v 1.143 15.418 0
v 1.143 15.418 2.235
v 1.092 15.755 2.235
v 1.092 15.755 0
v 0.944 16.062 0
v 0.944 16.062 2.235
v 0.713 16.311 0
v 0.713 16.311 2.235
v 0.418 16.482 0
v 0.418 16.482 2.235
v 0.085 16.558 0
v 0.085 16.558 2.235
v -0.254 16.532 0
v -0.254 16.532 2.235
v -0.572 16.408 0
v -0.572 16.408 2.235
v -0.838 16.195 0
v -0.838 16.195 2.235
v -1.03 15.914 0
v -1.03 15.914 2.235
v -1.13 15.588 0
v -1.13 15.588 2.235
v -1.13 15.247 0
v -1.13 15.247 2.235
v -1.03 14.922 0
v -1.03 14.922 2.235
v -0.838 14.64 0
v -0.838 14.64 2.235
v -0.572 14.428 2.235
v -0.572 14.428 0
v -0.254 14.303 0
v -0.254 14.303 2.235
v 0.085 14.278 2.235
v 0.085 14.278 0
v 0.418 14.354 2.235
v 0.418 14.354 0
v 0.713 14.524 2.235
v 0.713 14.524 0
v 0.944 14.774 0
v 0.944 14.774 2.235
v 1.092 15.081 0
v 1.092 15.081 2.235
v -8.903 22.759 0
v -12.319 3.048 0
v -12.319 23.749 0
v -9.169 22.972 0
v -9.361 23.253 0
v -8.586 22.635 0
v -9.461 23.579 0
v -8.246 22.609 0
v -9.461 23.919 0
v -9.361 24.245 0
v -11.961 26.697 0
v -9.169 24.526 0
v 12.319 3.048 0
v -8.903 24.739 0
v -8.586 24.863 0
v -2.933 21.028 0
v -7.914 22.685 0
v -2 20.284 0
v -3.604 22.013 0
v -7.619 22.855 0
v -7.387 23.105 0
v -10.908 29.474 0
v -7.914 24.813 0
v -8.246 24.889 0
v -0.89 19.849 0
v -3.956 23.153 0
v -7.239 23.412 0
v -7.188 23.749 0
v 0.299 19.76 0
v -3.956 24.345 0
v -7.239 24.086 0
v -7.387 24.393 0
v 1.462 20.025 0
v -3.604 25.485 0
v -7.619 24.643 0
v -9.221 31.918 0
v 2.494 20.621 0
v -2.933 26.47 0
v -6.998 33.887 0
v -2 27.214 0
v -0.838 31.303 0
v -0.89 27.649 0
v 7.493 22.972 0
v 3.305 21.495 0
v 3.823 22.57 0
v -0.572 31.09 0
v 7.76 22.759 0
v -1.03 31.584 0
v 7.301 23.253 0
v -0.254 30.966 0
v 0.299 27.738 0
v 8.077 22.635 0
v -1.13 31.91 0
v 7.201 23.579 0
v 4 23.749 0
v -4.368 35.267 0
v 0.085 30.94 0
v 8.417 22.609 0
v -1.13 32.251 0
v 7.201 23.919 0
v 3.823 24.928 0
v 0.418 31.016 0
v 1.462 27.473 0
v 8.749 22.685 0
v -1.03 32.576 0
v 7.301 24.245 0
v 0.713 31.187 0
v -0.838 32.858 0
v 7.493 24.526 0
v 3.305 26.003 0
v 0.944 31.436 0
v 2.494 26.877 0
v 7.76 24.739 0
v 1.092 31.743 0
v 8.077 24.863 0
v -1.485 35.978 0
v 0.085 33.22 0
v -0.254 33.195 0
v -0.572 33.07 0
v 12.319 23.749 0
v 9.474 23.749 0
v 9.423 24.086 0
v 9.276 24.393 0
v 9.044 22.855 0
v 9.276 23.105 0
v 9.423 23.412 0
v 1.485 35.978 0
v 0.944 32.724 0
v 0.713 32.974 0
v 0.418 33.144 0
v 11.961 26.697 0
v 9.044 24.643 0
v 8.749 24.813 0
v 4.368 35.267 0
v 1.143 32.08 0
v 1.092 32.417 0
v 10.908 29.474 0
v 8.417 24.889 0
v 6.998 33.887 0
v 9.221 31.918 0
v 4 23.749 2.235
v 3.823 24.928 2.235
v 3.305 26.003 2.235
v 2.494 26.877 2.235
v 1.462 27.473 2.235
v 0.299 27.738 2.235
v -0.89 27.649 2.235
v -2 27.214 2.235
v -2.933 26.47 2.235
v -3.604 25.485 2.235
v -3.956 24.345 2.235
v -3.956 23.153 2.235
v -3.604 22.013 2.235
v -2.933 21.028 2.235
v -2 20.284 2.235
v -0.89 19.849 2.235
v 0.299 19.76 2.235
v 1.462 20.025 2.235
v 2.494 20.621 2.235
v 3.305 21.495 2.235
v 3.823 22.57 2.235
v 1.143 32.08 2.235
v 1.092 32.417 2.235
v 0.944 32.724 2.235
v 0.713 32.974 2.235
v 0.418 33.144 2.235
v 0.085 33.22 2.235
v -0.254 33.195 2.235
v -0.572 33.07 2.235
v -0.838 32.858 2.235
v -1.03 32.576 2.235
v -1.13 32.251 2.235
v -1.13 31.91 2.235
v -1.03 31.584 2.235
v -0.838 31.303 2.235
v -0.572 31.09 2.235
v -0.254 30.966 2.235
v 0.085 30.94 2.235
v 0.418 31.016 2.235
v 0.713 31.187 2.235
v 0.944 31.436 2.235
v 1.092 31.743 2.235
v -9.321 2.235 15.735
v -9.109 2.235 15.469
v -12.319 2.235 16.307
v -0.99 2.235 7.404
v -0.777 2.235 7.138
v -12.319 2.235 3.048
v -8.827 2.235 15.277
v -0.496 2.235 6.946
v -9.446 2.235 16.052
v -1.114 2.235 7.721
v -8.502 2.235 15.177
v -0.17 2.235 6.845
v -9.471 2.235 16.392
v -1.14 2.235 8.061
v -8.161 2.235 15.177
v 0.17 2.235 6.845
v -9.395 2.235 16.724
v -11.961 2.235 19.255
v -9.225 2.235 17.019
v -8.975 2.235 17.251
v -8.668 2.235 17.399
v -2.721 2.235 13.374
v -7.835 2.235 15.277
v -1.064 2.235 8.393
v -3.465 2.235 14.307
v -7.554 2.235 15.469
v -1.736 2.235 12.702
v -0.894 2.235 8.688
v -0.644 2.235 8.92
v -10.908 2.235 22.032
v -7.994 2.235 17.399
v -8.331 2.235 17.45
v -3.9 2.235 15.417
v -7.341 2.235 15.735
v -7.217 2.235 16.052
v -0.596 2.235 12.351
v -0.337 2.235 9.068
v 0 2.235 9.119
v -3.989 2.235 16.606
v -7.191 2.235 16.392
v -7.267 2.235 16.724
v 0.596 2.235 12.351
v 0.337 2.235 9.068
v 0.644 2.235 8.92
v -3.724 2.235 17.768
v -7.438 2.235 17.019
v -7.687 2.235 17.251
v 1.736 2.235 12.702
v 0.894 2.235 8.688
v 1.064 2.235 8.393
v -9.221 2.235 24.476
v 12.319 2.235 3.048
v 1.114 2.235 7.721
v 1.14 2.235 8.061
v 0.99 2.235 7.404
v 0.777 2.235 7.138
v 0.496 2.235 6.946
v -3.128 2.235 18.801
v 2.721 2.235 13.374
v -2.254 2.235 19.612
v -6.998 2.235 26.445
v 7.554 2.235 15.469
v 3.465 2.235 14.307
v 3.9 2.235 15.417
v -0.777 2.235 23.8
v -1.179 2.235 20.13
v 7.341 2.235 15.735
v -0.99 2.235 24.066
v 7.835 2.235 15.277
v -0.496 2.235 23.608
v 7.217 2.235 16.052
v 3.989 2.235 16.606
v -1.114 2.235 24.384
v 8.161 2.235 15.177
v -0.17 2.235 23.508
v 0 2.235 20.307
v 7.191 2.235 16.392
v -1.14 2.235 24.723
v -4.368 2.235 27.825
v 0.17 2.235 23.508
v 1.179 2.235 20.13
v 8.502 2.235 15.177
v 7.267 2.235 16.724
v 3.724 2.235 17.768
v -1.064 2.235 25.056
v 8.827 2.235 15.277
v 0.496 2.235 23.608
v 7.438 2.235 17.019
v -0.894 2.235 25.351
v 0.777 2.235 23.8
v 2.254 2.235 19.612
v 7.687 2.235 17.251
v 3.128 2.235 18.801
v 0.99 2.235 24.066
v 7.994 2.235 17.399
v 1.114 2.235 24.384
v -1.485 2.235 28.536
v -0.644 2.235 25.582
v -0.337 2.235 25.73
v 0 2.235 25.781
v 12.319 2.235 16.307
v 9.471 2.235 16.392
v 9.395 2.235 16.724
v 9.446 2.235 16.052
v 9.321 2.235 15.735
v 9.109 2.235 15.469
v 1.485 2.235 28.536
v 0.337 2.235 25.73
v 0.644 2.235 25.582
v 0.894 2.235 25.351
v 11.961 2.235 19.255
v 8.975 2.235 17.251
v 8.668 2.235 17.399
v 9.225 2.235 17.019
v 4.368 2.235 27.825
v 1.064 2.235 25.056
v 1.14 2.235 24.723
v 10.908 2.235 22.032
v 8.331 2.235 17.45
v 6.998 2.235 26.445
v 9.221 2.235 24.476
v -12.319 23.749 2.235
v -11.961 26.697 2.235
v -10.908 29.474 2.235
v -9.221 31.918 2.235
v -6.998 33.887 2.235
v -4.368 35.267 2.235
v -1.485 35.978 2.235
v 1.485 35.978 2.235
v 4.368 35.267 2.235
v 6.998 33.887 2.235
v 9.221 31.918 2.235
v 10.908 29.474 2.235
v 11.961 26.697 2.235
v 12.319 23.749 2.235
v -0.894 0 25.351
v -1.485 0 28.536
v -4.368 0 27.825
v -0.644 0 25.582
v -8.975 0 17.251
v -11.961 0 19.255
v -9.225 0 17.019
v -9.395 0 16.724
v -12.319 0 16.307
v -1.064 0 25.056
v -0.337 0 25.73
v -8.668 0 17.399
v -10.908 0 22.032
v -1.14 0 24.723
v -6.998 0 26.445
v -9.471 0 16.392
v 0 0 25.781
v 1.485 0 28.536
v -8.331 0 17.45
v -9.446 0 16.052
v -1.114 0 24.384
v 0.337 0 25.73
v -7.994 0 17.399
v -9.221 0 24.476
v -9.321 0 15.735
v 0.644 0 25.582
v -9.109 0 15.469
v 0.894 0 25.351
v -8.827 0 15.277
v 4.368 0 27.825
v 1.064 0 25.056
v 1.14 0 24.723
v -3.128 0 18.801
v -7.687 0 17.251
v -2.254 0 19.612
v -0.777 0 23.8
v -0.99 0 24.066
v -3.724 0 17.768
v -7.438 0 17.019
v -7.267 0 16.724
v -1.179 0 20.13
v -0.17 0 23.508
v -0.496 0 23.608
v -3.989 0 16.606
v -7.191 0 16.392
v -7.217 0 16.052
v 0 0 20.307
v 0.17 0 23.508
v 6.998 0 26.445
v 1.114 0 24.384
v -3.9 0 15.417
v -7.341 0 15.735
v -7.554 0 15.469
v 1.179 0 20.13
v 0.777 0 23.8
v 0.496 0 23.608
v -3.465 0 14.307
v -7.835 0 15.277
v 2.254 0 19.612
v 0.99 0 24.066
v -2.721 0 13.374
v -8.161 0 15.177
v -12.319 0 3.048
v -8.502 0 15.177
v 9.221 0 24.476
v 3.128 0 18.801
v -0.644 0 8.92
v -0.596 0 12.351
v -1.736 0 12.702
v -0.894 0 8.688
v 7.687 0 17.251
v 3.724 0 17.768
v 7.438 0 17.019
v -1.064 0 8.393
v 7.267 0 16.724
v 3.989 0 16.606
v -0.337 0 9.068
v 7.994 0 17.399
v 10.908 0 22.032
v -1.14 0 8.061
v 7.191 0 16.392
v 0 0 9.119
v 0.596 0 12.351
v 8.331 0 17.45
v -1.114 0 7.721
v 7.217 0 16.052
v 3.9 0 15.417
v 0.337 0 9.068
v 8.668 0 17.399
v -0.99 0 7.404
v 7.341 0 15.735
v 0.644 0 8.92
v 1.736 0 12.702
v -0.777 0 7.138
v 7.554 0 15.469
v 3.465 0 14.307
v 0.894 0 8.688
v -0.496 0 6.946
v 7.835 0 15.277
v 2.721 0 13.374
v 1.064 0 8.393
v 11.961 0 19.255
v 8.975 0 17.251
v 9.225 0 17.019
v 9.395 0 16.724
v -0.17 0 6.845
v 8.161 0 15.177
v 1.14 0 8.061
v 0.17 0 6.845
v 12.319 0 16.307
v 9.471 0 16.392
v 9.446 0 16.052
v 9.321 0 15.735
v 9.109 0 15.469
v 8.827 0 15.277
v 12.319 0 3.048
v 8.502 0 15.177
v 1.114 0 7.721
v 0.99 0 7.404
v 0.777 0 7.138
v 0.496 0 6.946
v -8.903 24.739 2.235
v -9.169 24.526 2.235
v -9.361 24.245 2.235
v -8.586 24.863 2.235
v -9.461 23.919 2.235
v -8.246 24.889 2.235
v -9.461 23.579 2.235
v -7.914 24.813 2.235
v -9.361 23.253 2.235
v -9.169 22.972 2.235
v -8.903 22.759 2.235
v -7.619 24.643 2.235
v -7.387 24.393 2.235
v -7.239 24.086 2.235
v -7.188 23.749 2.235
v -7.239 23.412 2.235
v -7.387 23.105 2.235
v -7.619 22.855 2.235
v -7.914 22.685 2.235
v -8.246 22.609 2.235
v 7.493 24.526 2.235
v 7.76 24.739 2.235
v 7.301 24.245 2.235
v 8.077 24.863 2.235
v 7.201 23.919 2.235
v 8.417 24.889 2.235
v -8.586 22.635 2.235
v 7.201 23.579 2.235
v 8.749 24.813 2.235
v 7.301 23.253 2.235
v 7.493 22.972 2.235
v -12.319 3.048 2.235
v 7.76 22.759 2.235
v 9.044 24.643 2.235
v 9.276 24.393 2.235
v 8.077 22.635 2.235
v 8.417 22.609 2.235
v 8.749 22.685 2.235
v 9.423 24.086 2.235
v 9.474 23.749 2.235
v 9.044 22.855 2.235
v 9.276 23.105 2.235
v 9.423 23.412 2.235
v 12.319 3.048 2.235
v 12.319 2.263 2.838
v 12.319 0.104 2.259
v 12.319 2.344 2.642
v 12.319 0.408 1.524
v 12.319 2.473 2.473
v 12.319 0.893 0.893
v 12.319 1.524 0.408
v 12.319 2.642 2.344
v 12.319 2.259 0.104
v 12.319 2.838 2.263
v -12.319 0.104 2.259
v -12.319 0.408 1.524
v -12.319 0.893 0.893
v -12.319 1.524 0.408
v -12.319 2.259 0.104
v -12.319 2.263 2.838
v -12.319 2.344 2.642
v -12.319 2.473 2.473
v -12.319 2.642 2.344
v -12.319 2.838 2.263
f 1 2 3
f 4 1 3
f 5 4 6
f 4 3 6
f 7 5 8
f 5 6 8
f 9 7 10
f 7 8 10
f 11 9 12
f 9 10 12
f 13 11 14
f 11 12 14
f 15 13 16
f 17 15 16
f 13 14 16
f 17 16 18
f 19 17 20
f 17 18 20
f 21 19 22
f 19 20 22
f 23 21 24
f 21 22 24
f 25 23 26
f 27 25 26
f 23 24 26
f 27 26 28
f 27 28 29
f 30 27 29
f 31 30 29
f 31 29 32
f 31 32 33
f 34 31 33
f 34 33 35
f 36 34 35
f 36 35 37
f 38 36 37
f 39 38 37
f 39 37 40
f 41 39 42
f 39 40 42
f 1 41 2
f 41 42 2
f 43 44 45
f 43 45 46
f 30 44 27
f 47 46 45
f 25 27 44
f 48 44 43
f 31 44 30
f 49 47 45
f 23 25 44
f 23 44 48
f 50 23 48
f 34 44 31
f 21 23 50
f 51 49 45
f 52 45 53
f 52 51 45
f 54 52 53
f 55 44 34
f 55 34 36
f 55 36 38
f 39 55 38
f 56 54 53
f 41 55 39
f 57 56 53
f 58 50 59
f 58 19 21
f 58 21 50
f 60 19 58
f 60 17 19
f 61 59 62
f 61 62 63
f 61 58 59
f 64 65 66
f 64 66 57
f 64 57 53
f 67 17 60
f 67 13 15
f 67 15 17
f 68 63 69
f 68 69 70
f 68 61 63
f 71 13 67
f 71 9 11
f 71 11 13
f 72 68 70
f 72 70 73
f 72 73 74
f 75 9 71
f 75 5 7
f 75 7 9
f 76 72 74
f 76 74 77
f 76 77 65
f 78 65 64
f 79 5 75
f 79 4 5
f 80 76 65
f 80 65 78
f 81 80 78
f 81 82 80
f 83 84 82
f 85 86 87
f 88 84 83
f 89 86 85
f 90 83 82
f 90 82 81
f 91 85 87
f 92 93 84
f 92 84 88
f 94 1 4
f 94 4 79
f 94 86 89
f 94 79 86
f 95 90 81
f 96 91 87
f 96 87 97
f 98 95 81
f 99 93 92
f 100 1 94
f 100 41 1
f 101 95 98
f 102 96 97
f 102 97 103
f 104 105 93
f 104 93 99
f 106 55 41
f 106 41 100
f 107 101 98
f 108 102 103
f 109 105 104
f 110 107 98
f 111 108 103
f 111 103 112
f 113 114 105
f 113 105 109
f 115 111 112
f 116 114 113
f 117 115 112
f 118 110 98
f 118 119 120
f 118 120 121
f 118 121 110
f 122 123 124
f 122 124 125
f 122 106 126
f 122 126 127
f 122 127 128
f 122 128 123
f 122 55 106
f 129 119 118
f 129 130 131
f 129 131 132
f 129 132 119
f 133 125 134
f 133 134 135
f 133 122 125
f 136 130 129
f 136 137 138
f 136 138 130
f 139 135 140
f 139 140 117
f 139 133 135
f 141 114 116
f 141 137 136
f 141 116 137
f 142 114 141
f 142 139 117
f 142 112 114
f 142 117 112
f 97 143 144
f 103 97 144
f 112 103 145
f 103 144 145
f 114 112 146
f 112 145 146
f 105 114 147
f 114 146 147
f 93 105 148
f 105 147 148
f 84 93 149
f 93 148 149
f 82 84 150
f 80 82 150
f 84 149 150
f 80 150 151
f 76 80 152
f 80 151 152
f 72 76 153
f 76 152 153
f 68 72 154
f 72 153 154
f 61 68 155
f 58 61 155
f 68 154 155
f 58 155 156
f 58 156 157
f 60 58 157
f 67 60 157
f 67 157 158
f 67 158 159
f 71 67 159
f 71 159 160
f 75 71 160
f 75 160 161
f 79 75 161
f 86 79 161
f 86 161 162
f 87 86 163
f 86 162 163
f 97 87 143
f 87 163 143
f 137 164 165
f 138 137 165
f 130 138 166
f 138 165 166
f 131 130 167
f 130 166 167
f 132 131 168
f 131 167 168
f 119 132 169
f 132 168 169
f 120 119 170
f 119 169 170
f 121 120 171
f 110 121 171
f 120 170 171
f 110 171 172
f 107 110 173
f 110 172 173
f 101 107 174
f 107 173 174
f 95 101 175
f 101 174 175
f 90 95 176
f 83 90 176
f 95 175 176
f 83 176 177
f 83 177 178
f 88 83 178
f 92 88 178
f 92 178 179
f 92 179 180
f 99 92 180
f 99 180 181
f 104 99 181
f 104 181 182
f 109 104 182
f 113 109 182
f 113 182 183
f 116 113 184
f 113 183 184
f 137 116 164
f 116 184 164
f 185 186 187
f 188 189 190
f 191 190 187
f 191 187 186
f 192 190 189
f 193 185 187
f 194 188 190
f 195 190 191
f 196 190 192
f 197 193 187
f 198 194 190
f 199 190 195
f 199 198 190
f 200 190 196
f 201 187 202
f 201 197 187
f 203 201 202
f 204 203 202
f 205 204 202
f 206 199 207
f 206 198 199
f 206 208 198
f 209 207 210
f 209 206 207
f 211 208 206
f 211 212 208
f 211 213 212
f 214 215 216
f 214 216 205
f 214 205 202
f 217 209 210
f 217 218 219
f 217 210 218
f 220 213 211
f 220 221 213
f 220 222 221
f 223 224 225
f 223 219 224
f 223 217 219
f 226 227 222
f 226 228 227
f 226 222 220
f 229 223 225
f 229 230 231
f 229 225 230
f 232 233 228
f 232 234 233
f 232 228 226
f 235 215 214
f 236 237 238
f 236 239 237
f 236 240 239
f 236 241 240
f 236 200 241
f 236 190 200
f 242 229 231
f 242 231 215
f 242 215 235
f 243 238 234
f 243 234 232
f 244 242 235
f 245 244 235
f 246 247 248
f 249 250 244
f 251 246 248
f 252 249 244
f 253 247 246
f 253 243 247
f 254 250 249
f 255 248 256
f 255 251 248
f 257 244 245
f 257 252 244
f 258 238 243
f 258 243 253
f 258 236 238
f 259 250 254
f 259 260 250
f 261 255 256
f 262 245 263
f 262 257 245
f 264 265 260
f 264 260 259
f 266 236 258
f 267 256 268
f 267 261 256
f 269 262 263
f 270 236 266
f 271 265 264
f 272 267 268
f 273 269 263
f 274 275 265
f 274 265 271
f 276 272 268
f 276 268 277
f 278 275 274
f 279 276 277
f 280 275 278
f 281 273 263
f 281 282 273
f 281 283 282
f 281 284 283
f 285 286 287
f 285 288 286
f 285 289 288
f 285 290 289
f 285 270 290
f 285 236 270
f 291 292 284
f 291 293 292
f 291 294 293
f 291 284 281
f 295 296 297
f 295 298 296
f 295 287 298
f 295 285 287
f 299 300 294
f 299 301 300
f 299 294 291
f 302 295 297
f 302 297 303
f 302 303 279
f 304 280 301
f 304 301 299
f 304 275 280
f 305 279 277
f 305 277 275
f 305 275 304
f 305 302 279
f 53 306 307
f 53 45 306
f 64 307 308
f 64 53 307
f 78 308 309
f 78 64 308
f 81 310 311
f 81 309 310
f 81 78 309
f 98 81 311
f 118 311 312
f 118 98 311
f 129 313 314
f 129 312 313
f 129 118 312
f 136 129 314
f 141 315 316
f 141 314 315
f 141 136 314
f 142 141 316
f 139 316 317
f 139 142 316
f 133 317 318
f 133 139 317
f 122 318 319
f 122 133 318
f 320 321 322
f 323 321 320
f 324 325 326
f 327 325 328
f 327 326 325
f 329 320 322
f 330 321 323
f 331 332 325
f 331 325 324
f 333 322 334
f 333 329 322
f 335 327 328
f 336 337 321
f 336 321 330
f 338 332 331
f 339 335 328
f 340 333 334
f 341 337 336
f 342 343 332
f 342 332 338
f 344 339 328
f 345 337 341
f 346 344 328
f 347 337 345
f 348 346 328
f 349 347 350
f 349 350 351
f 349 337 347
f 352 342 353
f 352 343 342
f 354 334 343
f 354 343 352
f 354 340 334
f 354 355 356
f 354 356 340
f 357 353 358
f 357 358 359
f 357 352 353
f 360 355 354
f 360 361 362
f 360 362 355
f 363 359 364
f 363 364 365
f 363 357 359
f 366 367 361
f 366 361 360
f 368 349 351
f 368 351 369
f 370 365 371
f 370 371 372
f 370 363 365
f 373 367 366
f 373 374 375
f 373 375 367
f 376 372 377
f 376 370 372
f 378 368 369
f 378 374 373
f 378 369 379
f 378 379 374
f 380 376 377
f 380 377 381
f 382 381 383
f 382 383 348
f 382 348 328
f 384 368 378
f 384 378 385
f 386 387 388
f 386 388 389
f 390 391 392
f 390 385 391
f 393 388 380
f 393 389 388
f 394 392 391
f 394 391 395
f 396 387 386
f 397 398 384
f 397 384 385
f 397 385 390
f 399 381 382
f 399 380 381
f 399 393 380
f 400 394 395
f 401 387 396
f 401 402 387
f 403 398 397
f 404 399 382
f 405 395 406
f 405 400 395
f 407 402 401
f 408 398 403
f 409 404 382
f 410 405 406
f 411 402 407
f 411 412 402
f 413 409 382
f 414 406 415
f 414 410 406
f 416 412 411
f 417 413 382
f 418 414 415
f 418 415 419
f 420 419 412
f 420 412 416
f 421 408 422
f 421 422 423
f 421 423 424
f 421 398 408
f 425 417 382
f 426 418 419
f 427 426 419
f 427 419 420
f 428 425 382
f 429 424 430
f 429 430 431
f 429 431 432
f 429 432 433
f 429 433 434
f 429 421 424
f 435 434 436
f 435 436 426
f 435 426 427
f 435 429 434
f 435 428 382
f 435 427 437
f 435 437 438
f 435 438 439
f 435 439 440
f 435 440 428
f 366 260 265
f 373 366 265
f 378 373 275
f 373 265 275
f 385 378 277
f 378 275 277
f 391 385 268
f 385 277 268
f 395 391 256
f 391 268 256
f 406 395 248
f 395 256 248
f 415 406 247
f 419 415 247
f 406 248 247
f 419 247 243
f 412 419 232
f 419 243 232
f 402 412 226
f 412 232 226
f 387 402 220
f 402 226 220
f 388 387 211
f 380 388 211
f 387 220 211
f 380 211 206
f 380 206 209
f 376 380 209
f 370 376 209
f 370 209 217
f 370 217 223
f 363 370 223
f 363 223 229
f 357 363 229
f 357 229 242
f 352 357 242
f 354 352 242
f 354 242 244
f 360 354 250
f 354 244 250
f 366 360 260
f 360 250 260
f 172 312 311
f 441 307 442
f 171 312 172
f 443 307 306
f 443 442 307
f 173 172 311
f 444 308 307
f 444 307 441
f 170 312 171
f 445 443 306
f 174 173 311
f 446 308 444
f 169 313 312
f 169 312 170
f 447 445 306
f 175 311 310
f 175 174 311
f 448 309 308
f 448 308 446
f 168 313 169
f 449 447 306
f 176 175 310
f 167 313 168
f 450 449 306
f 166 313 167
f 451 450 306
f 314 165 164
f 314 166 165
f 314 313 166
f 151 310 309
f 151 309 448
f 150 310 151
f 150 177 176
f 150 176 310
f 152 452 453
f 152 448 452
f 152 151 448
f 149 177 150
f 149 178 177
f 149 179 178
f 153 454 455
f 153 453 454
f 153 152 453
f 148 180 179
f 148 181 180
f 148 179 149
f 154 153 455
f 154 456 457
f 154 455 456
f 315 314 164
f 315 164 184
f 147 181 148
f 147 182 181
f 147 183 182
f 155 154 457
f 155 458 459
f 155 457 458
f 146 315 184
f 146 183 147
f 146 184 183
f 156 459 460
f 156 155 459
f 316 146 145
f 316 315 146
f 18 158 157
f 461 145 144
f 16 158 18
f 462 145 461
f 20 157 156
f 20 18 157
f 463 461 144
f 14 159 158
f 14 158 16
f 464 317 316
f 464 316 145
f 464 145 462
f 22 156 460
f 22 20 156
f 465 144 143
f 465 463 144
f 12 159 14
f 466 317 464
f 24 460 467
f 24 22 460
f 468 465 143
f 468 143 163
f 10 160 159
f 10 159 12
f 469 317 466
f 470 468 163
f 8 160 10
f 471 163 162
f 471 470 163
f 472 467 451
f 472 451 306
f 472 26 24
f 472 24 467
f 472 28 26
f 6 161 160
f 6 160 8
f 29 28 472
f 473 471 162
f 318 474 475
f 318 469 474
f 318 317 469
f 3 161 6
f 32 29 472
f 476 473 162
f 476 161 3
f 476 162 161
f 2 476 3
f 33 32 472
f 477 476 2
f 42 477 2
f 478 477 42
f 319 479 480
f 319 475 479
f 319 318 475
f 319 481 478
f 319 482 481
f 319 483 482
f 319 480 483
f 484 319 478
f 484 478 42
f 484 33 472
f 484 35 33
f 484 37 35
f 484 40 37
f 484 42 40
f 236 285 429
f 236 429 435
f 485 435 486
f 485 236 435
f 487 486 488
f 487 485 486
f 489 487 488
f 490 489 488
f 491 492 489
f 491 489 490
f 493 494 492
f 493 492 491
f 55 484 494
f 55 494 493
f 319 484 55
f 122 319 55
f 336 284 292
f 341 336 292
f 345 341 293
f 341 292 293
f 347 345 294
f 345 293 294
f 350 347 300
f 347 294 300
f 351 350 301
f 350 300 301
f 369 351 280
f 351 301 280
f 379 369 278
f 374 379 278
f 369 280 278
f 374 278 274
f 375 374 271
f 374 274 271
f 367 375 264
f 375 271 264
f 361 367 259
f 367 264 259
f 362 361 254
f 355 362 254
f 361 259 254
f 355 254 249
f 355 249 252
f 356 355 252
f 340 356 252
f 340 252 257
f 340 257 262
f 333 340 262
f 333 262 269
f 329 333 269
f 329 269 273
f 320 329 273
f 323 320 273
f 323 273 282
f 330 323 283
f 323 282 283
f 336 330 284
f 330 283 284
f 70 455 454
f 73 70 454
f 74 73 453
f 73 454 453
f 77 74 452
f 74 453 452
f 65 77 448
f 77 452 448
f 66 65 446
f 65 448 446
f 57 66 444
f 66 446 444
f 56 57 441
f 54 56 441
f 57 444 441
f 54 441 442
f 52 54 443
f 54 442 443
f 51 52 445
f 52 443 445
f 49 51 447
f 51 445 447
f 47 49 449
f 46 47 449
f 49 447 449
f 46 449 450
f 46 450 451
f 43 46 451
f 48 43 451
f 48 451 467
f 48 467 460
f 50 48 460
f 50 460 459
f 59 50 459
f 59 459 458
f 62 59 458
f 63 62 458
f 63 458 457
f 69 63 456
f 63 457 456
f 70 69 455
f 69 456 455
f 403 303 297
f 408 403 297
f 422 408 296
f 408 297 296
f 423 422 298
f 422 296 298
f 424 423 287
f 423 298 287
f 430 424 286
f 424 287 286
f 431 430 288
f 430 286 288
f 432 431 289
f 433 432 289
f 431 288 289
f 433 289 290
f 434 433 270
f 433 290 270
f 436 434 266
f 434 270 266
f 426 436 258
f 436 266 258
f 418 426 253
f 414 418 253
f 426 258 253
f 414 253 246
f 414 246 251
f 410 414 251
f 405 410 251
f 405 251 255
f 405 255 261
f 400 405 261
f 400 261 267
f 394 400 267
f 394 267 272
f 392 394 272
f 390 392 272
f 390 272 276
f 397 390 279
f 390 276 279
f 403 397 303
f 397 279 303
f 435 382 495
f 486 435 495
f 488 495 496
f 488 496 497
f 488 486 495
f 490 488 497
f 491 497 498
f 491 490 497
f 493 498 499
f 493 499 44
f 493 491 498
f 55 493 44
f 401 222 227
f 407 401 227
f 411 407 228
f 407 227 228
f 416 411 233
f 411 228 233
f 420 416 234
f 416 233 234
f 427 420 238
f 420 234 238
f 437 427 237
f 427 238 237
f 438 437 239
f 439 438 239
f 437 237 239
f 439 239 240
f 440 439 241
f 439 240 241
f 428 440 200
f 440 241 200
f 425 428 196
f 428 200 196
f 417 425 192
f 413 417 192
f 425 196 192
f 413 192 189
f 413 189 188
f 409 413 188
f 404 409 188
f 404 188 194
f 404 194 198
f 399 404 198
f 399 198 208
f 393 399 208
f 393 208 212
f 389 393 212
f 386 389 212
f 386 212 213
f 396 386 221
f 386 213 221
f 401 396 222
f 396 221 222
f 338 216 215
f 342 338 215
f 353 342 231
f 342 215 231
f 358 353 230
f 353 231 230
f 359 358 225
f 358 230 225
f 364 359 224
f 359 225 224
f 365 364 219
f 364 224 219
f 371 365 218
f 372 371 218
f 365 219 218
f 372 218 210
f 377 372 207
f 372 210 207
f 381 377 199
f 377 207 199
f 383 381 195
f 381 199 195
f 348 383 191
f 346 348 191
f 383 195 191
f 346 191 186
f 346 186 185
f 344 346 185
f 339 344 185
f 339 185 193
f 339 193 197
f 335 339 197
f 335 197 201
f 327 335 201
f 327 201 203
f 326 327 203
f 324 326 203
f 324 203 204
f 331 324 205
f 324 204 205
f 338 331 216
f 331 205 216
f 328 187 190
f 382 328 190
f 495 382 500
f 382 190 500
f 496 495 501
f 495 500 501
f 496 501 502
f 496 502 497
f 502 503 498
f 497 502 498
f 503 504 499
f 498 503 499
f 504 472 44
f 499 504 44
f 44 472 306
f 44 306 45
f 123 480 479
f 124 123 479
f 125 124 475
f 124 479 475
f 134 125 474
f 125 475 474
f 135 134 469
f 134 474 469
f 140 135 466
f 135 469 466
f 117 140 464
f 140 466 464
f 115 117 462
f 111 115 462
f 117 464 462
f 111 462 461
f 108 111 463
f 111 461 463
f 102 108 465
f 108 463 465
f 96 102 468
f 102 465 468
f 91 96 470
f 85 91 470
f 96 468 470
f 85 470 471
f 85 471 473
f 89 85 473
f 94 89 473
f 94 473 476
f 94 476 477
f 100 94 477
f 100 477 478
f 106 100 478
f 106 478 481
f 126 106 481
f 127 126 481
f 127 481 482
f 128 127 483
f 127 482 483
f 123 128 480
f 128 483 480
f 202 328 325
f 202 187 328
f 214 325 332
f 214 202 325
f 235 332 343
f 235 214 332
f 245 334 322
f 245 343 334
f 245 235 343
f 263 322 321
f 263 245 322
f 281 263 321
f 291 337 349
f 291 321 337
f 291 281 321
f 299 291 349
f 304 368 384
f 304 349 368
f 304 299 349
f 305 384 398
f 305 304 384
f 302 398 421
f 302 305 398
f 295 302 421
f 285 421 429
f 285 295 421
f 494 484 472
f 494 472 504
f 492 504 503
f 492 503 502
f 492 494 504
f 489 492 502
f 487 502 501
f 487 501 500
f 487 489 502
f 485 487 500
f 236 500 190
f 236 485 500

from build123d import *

# Parameters (mm, degrees)
BASE_FLANGE1_DEPTH = 12.319
FILLET1_RADIUS     = 12.319
FILLET1_LENGTH     = 2.2352
FILLET2_RADIUS     = 12.319
FILLET2_LENGTH     = 2.2352
SKETCH3_R          = 4.0005
SKETCH3_R_2        = 1.143
EXTRUDE1_DEPTH     = 2.2352
SKETCH5_R          = 4.0005
SKETCH5_R_2        = 1.143
EXTRUDE2_DEPTH     = 2.2352


# Sheet-metal steps are written as plain solids
with BuildPart() as part:
    # Sketch1 → Base-Flange1 (new, symmetric)
    with BuildSketch(Plane(origin=(0, 0, 0), x_dir=(0, 0, -1), z_dir=(1, 0, 0))):
        with BuildLine():
            Line((-28.6258, 0), (-3.048, 0))
            ThreePointArc((-3.048, 0), (-0.892738531, 0.892738531), (0, 3.048))
            Line((0, 3.048), (0, 36.068))
            Line((0, 36.068), (-2.2352, 36.068))
            Line((-2.2352, 36.068), (-2.2352, 3.048))
            ThreePointArc((-2.2352, 3.048), (-2.473263608, 2.473263608), (-3.048, 2.2352))
            Line((-3.048, 2.2352), (-28.6258, 2.2352))
            Line((-28.6258, 2.2352), (-28.6258, 0))
        make_face()
    extrude(amount=BASE_FLANGE1_DEPTH, both=True)

    # Fillet1: full round fillet: the end face becomes a half cylinder, R = half its width
    fillet1_face = Plane((0, 36.068, 1.1176), x_dir=(0, 0, -1), z_dir=(0, 1, 0))  # on the end face: x along it, z out of the body
    fillet1_slab = fillet1_face.offset(-FILLET1_RADIUS / 2) * Box(FILLET1_LENGTH, 2 * FILLET1_RADIUS, FILLET1_RADIUS, mode=Mode.PRIVATE)  # the body's end, R deep
    fillet1_round = Plane((0, 23.749, 1.1176), x_dir=(0, 1, 0), z_dir=(0, 0, -1)) * Cylinder(FILLET1_RADIUS, FILLET1_LENGTH, mode=Mode.PRIVATE)  # its axis R under the face
    add(fillet1_slab - fillet1_round, mode=Mode.SUBTRACT)

    # Fillet2: full round fillet: the end face becomes a half cylinder, R = half its width
    fillet2_face = Plane((0, 1.1176, 28.6258), x_dir=(0, 1, 0), z_dir=(0, 0, 1))  # on the end face: x along it, z out of the body
    fillet2_slab = fillet2_face.offset(-FILLET2_RADIUS / 2) * Box(FILLET2_LENGTH, 2 * FILLET2_RADIUS, FILLET2_RADIUS, mode=Mode.PRIVATE)  # the body's end, R deep
    fillet2_round = Plane((0, 1.1176, 16.3068), x_dir=(0, 0, 1), z_dir=(0, 1, 0)) * Cylinder(FILLET2_RADIUS, FILLET2_LENGTH, mode=Mode.PRIVATE)  # its axis R under the face
    add(fillet2_slab - fillet2_round, mode=Mode.SUBTRACT)

    # Sketch3 → Extrude1 (cut)
    with BuildSketch(Plane.XY.offset(2.2352)):
        with Locations((0, 23.749)):
            Circle(SKETCH3_R)
        with Locations((0, 32.0802)):
            Circle(SKETCH3_R_2)
        with Locations((8.3312, 23.749)):
            Circle(SKETCH3_R_2)
        with Locations((0, 15.4178)):
            Circle(SKETCH3_R_2)
        with Locations((-8.3312, 23.749)):
            Circle(SKETCH3_R_2)
    extrude(amount=-EXTRUDE1_DEPTH, mode=Mode.SUBTRACT)

    # Sketch5 → Extrude2 (cut)
    with BuildSketch(Plane(origin=(0, 2.2352, 0), x_dir=(1, 0, 0), z_dir=(0, 1, 0))):
        with Locations(Location((0, -16.3068, 0), (0, 0, 270))):
            Circle(SKETCH5_R)
        with Locations(Location((0, -7.9756, 0), (0, 0, 270))):
            Circle(SKETCH5_R_2)
        with Locations(Location((8.3312, -16.3068, 0), (0, 0, 270))):
            Circle(SKETCH5_R_2)
        with Locations(Location((0, -24.638, 0), (0, 0, 270))):
            Circle(SKETCH5_R_2)
        with Locations(Location((-8.3312, -16.3068, 0), (0, 0, 270))):
            Circle(SKETCH5_R_2)
    extrude(amount=-EXTRUDE2_DEPTH, mode=Mode.SUBTRACT)


solid = part.part
